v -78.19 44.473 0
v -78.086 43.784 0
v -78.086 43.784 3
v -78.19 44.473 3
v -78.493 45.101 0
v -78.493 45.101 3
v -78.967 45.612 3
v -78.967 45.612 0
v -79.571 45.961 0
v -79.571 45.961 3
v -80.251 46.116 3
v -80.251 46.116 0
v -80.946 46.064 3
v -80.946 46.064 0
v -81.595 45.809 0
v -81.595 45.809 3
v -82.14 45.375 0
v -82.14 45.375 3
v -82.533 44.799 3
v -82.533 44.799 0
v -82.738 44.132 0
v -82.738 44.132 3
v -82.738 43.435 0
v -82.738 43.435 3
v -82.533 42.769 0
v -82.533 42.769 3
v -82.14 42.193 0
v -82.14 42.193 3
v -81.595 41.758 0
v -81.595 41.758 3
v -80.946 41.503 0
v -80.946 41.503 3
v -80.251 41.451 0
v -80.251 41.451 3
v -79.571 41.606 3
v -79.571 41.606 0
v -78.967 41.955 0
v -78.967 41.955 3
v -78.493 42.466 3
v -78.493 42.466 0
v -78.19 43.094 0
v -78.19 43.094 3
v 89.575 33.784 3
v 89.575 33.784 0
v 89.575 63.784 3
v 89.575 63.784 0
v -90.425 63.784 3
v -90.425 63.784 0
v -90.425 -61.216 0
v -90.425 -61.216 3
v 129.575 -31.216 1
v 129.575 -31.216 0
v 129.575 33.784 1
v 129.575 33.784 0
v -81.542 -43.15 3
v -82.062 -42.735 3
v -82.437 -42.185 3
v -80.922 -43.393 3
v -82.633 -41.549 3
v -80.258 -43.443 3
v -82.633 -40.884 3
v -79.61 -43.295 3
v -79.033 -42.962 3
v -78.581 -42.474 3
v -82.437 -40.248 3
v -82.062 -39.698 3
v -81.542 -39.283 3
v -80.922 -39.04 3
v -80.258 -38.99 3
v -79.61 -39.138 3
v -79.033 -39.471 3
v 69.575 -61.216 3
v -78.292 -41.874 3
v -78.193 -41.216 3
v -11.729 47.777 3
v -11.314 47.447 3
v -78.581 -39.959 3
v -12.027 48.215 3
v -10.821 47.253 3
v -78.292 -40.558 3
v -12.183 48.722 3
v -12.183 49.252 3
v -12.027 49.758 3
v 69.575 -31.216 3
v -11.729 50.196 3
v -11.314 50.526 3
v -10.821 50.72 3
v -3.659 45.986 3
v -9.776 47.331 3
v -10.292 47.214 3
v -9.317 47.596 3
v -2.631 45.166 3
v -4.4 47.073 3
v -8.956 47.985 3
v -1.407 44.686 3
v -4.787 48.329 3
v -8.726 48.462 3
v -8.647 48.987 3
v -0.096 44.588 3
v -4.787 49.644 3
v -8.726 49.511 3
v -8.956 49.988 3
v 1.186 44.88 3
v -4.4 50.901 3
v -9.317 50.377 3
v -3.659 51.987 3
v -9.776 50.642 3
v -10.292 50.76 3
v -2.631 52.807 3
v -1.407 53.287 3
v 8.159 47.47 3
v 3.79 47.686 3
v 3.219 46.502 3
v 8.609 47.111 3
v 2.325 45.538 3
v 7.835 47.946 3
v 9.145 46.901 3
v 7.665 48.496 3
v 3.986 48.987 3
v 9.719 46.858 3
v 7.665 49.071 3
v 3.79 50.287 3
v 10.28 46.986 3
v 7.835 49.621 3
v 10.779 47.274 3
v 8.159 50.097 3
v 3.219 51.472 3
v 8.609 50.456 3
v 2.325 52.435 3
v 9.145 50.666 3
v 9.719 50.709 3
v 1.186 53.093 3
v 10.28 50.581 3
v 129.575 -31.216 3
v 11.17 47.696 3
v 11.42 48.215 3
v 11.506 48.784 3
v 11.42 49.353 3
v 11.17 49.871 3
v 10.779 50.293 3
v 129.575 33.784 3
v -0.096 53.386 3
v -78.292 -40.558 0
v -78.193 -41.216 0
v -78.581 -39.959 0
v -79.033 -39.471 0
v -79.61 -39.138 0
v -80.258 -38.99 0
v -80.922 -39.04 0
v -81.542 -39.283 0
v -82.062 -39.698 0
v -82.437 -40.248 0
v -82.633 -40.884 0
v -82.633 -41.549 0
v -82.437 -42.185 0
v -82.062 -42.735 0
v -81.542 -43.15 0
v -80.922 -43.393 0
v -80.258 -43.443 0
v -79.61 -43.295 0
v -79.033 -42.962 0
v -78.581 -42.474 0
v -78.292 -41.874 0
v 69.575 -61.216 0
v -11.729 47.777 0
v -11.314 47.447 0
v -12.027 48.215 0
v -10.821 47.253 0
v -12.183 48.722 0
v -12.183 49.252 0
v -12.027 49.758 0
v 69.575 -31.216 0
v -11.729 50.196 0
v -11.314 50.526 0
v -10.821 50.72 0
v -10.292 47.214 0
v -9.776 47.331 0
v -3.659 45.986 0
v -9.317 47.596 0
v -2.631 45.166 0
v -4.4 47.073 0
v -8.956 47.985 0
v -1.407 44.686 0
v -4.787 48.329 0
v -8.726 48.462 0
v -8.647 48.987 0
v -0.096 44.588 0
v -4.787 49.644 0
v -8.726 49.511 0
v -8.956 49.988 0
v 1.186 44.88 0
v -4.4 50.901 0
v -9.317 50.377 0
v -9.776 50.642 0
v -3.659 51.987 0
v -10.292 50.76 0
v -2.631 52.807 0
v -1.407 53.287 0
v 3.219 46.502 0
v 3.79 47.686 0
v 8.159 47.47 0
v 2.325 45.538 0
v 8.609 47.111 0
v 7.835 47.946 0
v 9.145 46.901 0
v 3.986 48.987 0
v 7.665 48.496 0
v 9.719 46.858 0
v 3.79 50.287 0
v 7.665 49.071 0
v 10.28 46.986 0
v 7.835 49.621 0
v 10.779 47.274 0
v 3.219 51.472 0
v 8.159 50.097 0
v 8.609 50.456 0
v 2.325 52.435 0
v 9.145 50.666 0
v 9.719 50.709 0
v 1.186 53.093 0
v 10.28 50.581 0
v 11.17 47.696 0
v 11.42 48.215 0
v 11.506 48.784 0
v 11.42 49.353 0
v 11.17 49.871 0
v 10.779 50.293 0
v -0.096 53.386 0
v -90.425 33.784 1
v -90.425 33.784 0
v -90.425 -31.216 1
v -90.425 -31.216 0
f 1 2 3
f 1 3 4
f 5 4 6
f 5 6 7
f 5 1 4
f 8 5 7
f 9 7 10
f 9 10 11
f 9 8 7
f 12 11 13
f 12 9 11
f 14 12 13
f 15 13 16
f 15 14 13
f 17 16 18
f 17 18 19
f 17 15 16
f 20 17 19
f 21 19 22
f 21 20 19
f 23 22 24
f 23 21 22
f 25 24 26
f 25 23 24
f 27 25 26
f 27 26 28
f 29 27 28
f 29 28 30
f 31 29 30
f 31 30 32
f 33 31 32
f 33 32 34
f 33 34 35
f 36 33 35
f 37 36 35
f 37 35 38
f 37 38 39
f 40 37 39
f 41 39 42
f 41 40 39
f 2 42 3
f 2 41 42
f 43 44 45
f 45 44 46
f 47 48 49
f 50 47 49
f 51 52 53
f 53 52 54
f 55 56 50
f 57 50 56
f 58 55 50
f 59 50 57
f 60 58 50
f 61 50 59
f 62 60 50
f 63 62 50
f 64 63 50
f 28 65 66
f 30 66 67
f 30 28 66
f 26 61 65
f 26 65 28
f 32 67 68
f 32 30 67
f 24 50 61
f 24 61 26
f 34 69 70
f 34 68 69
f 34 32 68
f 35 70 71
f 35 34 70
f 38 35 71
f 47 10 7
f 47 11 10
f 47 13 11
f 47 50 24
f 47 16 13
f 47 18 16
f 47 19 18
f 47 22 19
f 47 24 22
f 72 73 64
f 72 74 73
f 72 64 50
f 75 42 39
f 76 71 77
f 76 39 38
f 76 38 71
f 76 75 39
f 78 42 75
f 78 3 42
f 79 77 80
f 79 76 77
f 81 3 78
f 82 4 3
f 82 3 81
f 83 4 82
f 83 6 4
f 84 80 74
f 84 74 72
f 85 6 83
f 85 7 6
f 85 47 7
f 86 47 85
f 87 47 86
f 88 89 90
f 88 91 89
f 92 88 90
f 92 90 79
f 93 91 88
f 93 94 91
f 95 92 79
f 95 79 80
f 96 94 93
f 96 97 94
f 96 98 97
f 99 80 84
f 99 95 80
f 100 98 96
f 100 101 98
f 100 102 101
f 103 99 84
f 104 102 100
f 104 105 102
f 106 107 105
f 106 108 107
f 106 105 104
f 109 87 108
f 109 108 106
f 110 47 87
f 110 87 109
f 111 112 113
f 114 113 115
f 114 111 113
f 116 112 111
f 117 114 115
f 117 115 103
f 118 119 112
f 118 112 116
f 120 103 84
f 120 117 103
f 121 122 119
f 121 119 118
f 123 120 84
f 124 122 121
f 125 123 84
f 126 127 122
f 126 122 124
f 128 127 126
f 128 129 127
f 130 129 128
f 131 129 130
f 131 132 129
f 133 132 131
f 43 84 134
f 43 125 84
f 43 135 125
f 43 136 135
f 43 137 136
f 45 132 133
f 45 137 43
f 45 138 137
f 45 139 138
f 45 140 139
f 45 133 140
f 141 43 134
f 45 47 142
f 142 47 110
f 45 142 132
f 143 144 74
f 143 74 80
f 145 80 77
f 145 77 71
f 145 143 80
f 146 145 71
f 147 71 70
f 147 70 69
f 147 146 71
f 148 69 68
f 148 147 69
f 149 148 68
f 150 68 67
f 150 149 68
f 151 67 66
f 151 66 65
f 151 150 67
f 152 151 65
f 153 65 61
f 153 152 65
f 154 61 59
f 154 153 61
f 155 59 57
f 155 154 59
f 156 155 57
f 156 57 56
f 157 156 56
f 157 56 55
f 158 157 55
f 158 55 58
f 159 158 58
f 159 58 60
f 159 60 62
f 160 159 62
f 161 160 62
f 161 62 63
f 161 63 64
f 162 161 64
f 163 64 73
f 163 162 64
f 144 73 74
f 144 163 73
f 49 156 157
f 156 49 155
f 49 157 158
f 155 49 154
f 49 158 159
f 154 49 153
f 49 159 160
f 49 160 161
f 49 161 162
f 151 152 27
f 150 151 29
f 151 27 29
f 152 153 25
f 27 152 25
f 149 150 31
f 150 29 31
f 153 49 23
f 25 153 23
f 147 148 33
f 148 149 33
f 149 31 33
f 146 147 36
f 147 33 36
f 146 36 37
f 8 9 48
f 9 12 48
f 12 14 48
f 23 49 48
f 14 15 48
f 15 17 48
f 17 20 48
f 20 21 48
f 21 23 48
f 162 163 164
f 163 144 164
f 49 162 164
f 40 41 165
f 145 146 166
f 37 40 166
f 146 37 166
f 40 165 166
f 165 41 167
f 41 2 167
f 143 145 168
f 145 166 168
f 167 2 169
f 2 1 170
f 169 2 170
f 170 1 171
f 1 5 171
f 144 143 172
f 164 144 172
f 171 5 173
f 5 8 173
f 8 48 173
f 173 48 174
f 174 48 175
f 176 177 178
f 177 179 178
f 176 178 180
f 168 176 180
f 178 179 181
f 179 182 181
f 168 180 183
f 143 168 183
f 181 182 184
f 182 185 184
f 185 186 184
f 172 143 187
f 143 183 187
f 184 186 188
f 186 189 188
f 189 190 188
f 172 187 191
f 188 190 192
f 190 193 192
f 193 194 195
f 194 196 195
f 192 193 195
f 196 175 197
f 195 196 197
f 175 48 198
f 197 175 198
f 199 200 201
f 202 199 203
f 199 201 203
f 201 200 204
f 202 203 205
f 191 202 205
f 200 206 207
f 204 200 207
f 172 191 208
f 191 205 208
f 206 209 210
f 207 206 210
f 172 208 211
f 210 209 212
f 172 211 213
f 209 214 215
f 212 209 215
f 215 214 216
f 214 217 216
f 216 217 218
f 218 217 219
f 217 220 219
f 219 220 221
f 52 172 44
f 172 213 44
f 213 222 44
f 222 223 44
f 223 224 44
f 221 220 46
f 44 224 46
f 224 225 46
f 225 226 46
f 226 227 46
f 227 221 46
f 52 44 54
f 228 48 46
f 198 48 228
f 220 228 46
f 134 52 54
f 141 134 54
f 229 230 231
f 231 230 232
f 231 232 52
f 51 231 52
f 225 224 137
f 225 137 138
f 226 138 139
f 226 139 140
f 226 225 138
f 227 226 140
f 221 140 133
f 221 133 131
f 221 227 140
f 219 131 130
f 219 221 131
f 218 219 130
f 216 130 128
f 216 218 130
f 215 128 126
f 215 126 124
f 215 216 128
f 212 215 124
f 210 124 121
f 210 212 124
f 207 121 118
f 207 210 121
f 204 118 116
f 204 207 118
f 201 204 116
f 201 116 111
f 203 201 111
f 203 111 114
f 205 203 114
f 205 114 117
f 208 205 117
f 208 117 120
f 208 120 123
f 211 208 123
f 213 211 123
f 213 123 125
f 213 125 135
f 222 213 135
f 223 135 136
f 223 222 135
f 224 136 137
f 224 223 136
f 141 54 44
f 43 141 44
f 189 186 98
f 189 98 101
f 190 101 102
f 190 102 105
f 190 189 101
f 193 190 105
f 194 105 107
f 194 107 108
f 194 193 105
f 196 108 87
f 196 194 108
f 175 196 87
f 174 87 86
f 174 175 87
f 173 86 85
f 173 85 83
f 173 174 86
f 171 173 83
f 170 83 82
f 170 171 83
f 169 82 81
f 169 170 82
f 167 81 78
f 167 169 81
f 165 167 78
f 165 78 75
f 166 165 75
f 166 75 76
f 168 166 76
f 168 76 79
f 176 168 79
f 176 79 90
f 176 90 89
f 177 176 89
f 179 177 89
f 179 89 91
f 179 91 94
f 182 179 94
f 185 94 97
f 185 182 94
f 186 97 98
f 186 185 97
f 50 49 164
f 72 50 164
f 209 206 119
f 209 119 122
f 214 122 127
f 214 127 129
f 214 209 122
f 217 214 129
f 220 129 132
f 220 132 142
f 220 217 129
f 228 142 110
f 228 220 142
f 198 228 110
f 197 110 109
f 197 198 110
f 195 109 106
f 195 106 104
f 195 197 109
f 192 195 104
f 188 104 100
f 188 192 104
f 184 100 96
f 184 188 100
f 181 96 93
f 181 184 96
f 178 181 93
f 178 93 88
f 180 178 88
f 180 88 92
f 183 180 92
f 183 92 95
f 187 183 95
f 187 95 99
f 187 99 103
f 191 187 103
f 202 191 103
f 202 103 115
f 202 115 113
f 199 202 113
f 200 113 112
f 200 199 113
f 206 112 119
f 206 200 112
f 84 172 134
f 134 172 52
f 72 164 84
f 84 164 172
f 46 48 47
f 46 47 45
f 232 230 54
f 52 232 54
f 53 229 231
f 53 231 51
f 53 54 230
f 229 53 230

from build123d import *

# Parameters (mm, degrees)
F0_W     = 180
F0_H     = 30
F0_R     = 2.3391107882
F0_R_2   = 1.7779977582
F0_R_3   = 4.4113535935
F0_R_4   = 1.9309092274
F0_W_2   = 160
F0_R_5   = 2.2327370736
F1_DEPTH = 3
F2_DEPTH = 1


# Not quite as in the source:
# - a feature names something its author has since deleted; it is built from what else it names


with BuildPart() as f1:
    # F0 (on Top) → F1 (new body)
    with BuildSketch(Plane.XY):
        with Locations((-0.42535007, 48.7836791575)):
            Rectangle(F0_W, F0_H)
        with Locations((-80.42535007, 43.7836791575)):
            Circle(F0_R, mode=Mode.SUBTRACT)
        with Locations((-10.42535007, 48.9865408171)):
            Circle(F0_R_2, mode=Mode.SUBTRACT)
        with Locations((-0.42535007, 48.9865408171)):
            Circle(F0_R_3, mode=Mode.SUBTRACT)
        with Locations((9.57464993, 48.7836791575)):
            Circle(F0_R_4, mode=Mode.SUBTRACT)
        Polygon((89.57464993, 33.7836791575), (-90.42535007, 33.7836791575), (-90.42535007, -31.2163208425), (69.57464993, -31.2163208425), (129.57464993, -31.2163208425), (129.57464993, 33.7836791575), align=None)
        with Locations((-10.42535007, -46.2163208425)):
            Rectangle(F0_W_2, F0_H)
        with Locations((-80.42535007, -41.2163208425)):
            Circle(F0_R_5, mode=Mode.SUBTRACT)
    extrude(amount=F1_DEPTH)


with BuildPart() as f2:
    # F0 (on Top) → F2 (new body)
    with BuildSketch(Plane.XY):
        Polygon((89.57464993, 33.7836791575), (-90.42535007, 33.7836791575), (-90.42535007, -31.2163208425), (69.57464993, -31.2163208425), (129.57464993, -31.2163208425), (129.57464993, 33.7836791575), align=None)
    extrude(amount=F2_DEPTH)


solid = Compound([f1.part, f2.part])
